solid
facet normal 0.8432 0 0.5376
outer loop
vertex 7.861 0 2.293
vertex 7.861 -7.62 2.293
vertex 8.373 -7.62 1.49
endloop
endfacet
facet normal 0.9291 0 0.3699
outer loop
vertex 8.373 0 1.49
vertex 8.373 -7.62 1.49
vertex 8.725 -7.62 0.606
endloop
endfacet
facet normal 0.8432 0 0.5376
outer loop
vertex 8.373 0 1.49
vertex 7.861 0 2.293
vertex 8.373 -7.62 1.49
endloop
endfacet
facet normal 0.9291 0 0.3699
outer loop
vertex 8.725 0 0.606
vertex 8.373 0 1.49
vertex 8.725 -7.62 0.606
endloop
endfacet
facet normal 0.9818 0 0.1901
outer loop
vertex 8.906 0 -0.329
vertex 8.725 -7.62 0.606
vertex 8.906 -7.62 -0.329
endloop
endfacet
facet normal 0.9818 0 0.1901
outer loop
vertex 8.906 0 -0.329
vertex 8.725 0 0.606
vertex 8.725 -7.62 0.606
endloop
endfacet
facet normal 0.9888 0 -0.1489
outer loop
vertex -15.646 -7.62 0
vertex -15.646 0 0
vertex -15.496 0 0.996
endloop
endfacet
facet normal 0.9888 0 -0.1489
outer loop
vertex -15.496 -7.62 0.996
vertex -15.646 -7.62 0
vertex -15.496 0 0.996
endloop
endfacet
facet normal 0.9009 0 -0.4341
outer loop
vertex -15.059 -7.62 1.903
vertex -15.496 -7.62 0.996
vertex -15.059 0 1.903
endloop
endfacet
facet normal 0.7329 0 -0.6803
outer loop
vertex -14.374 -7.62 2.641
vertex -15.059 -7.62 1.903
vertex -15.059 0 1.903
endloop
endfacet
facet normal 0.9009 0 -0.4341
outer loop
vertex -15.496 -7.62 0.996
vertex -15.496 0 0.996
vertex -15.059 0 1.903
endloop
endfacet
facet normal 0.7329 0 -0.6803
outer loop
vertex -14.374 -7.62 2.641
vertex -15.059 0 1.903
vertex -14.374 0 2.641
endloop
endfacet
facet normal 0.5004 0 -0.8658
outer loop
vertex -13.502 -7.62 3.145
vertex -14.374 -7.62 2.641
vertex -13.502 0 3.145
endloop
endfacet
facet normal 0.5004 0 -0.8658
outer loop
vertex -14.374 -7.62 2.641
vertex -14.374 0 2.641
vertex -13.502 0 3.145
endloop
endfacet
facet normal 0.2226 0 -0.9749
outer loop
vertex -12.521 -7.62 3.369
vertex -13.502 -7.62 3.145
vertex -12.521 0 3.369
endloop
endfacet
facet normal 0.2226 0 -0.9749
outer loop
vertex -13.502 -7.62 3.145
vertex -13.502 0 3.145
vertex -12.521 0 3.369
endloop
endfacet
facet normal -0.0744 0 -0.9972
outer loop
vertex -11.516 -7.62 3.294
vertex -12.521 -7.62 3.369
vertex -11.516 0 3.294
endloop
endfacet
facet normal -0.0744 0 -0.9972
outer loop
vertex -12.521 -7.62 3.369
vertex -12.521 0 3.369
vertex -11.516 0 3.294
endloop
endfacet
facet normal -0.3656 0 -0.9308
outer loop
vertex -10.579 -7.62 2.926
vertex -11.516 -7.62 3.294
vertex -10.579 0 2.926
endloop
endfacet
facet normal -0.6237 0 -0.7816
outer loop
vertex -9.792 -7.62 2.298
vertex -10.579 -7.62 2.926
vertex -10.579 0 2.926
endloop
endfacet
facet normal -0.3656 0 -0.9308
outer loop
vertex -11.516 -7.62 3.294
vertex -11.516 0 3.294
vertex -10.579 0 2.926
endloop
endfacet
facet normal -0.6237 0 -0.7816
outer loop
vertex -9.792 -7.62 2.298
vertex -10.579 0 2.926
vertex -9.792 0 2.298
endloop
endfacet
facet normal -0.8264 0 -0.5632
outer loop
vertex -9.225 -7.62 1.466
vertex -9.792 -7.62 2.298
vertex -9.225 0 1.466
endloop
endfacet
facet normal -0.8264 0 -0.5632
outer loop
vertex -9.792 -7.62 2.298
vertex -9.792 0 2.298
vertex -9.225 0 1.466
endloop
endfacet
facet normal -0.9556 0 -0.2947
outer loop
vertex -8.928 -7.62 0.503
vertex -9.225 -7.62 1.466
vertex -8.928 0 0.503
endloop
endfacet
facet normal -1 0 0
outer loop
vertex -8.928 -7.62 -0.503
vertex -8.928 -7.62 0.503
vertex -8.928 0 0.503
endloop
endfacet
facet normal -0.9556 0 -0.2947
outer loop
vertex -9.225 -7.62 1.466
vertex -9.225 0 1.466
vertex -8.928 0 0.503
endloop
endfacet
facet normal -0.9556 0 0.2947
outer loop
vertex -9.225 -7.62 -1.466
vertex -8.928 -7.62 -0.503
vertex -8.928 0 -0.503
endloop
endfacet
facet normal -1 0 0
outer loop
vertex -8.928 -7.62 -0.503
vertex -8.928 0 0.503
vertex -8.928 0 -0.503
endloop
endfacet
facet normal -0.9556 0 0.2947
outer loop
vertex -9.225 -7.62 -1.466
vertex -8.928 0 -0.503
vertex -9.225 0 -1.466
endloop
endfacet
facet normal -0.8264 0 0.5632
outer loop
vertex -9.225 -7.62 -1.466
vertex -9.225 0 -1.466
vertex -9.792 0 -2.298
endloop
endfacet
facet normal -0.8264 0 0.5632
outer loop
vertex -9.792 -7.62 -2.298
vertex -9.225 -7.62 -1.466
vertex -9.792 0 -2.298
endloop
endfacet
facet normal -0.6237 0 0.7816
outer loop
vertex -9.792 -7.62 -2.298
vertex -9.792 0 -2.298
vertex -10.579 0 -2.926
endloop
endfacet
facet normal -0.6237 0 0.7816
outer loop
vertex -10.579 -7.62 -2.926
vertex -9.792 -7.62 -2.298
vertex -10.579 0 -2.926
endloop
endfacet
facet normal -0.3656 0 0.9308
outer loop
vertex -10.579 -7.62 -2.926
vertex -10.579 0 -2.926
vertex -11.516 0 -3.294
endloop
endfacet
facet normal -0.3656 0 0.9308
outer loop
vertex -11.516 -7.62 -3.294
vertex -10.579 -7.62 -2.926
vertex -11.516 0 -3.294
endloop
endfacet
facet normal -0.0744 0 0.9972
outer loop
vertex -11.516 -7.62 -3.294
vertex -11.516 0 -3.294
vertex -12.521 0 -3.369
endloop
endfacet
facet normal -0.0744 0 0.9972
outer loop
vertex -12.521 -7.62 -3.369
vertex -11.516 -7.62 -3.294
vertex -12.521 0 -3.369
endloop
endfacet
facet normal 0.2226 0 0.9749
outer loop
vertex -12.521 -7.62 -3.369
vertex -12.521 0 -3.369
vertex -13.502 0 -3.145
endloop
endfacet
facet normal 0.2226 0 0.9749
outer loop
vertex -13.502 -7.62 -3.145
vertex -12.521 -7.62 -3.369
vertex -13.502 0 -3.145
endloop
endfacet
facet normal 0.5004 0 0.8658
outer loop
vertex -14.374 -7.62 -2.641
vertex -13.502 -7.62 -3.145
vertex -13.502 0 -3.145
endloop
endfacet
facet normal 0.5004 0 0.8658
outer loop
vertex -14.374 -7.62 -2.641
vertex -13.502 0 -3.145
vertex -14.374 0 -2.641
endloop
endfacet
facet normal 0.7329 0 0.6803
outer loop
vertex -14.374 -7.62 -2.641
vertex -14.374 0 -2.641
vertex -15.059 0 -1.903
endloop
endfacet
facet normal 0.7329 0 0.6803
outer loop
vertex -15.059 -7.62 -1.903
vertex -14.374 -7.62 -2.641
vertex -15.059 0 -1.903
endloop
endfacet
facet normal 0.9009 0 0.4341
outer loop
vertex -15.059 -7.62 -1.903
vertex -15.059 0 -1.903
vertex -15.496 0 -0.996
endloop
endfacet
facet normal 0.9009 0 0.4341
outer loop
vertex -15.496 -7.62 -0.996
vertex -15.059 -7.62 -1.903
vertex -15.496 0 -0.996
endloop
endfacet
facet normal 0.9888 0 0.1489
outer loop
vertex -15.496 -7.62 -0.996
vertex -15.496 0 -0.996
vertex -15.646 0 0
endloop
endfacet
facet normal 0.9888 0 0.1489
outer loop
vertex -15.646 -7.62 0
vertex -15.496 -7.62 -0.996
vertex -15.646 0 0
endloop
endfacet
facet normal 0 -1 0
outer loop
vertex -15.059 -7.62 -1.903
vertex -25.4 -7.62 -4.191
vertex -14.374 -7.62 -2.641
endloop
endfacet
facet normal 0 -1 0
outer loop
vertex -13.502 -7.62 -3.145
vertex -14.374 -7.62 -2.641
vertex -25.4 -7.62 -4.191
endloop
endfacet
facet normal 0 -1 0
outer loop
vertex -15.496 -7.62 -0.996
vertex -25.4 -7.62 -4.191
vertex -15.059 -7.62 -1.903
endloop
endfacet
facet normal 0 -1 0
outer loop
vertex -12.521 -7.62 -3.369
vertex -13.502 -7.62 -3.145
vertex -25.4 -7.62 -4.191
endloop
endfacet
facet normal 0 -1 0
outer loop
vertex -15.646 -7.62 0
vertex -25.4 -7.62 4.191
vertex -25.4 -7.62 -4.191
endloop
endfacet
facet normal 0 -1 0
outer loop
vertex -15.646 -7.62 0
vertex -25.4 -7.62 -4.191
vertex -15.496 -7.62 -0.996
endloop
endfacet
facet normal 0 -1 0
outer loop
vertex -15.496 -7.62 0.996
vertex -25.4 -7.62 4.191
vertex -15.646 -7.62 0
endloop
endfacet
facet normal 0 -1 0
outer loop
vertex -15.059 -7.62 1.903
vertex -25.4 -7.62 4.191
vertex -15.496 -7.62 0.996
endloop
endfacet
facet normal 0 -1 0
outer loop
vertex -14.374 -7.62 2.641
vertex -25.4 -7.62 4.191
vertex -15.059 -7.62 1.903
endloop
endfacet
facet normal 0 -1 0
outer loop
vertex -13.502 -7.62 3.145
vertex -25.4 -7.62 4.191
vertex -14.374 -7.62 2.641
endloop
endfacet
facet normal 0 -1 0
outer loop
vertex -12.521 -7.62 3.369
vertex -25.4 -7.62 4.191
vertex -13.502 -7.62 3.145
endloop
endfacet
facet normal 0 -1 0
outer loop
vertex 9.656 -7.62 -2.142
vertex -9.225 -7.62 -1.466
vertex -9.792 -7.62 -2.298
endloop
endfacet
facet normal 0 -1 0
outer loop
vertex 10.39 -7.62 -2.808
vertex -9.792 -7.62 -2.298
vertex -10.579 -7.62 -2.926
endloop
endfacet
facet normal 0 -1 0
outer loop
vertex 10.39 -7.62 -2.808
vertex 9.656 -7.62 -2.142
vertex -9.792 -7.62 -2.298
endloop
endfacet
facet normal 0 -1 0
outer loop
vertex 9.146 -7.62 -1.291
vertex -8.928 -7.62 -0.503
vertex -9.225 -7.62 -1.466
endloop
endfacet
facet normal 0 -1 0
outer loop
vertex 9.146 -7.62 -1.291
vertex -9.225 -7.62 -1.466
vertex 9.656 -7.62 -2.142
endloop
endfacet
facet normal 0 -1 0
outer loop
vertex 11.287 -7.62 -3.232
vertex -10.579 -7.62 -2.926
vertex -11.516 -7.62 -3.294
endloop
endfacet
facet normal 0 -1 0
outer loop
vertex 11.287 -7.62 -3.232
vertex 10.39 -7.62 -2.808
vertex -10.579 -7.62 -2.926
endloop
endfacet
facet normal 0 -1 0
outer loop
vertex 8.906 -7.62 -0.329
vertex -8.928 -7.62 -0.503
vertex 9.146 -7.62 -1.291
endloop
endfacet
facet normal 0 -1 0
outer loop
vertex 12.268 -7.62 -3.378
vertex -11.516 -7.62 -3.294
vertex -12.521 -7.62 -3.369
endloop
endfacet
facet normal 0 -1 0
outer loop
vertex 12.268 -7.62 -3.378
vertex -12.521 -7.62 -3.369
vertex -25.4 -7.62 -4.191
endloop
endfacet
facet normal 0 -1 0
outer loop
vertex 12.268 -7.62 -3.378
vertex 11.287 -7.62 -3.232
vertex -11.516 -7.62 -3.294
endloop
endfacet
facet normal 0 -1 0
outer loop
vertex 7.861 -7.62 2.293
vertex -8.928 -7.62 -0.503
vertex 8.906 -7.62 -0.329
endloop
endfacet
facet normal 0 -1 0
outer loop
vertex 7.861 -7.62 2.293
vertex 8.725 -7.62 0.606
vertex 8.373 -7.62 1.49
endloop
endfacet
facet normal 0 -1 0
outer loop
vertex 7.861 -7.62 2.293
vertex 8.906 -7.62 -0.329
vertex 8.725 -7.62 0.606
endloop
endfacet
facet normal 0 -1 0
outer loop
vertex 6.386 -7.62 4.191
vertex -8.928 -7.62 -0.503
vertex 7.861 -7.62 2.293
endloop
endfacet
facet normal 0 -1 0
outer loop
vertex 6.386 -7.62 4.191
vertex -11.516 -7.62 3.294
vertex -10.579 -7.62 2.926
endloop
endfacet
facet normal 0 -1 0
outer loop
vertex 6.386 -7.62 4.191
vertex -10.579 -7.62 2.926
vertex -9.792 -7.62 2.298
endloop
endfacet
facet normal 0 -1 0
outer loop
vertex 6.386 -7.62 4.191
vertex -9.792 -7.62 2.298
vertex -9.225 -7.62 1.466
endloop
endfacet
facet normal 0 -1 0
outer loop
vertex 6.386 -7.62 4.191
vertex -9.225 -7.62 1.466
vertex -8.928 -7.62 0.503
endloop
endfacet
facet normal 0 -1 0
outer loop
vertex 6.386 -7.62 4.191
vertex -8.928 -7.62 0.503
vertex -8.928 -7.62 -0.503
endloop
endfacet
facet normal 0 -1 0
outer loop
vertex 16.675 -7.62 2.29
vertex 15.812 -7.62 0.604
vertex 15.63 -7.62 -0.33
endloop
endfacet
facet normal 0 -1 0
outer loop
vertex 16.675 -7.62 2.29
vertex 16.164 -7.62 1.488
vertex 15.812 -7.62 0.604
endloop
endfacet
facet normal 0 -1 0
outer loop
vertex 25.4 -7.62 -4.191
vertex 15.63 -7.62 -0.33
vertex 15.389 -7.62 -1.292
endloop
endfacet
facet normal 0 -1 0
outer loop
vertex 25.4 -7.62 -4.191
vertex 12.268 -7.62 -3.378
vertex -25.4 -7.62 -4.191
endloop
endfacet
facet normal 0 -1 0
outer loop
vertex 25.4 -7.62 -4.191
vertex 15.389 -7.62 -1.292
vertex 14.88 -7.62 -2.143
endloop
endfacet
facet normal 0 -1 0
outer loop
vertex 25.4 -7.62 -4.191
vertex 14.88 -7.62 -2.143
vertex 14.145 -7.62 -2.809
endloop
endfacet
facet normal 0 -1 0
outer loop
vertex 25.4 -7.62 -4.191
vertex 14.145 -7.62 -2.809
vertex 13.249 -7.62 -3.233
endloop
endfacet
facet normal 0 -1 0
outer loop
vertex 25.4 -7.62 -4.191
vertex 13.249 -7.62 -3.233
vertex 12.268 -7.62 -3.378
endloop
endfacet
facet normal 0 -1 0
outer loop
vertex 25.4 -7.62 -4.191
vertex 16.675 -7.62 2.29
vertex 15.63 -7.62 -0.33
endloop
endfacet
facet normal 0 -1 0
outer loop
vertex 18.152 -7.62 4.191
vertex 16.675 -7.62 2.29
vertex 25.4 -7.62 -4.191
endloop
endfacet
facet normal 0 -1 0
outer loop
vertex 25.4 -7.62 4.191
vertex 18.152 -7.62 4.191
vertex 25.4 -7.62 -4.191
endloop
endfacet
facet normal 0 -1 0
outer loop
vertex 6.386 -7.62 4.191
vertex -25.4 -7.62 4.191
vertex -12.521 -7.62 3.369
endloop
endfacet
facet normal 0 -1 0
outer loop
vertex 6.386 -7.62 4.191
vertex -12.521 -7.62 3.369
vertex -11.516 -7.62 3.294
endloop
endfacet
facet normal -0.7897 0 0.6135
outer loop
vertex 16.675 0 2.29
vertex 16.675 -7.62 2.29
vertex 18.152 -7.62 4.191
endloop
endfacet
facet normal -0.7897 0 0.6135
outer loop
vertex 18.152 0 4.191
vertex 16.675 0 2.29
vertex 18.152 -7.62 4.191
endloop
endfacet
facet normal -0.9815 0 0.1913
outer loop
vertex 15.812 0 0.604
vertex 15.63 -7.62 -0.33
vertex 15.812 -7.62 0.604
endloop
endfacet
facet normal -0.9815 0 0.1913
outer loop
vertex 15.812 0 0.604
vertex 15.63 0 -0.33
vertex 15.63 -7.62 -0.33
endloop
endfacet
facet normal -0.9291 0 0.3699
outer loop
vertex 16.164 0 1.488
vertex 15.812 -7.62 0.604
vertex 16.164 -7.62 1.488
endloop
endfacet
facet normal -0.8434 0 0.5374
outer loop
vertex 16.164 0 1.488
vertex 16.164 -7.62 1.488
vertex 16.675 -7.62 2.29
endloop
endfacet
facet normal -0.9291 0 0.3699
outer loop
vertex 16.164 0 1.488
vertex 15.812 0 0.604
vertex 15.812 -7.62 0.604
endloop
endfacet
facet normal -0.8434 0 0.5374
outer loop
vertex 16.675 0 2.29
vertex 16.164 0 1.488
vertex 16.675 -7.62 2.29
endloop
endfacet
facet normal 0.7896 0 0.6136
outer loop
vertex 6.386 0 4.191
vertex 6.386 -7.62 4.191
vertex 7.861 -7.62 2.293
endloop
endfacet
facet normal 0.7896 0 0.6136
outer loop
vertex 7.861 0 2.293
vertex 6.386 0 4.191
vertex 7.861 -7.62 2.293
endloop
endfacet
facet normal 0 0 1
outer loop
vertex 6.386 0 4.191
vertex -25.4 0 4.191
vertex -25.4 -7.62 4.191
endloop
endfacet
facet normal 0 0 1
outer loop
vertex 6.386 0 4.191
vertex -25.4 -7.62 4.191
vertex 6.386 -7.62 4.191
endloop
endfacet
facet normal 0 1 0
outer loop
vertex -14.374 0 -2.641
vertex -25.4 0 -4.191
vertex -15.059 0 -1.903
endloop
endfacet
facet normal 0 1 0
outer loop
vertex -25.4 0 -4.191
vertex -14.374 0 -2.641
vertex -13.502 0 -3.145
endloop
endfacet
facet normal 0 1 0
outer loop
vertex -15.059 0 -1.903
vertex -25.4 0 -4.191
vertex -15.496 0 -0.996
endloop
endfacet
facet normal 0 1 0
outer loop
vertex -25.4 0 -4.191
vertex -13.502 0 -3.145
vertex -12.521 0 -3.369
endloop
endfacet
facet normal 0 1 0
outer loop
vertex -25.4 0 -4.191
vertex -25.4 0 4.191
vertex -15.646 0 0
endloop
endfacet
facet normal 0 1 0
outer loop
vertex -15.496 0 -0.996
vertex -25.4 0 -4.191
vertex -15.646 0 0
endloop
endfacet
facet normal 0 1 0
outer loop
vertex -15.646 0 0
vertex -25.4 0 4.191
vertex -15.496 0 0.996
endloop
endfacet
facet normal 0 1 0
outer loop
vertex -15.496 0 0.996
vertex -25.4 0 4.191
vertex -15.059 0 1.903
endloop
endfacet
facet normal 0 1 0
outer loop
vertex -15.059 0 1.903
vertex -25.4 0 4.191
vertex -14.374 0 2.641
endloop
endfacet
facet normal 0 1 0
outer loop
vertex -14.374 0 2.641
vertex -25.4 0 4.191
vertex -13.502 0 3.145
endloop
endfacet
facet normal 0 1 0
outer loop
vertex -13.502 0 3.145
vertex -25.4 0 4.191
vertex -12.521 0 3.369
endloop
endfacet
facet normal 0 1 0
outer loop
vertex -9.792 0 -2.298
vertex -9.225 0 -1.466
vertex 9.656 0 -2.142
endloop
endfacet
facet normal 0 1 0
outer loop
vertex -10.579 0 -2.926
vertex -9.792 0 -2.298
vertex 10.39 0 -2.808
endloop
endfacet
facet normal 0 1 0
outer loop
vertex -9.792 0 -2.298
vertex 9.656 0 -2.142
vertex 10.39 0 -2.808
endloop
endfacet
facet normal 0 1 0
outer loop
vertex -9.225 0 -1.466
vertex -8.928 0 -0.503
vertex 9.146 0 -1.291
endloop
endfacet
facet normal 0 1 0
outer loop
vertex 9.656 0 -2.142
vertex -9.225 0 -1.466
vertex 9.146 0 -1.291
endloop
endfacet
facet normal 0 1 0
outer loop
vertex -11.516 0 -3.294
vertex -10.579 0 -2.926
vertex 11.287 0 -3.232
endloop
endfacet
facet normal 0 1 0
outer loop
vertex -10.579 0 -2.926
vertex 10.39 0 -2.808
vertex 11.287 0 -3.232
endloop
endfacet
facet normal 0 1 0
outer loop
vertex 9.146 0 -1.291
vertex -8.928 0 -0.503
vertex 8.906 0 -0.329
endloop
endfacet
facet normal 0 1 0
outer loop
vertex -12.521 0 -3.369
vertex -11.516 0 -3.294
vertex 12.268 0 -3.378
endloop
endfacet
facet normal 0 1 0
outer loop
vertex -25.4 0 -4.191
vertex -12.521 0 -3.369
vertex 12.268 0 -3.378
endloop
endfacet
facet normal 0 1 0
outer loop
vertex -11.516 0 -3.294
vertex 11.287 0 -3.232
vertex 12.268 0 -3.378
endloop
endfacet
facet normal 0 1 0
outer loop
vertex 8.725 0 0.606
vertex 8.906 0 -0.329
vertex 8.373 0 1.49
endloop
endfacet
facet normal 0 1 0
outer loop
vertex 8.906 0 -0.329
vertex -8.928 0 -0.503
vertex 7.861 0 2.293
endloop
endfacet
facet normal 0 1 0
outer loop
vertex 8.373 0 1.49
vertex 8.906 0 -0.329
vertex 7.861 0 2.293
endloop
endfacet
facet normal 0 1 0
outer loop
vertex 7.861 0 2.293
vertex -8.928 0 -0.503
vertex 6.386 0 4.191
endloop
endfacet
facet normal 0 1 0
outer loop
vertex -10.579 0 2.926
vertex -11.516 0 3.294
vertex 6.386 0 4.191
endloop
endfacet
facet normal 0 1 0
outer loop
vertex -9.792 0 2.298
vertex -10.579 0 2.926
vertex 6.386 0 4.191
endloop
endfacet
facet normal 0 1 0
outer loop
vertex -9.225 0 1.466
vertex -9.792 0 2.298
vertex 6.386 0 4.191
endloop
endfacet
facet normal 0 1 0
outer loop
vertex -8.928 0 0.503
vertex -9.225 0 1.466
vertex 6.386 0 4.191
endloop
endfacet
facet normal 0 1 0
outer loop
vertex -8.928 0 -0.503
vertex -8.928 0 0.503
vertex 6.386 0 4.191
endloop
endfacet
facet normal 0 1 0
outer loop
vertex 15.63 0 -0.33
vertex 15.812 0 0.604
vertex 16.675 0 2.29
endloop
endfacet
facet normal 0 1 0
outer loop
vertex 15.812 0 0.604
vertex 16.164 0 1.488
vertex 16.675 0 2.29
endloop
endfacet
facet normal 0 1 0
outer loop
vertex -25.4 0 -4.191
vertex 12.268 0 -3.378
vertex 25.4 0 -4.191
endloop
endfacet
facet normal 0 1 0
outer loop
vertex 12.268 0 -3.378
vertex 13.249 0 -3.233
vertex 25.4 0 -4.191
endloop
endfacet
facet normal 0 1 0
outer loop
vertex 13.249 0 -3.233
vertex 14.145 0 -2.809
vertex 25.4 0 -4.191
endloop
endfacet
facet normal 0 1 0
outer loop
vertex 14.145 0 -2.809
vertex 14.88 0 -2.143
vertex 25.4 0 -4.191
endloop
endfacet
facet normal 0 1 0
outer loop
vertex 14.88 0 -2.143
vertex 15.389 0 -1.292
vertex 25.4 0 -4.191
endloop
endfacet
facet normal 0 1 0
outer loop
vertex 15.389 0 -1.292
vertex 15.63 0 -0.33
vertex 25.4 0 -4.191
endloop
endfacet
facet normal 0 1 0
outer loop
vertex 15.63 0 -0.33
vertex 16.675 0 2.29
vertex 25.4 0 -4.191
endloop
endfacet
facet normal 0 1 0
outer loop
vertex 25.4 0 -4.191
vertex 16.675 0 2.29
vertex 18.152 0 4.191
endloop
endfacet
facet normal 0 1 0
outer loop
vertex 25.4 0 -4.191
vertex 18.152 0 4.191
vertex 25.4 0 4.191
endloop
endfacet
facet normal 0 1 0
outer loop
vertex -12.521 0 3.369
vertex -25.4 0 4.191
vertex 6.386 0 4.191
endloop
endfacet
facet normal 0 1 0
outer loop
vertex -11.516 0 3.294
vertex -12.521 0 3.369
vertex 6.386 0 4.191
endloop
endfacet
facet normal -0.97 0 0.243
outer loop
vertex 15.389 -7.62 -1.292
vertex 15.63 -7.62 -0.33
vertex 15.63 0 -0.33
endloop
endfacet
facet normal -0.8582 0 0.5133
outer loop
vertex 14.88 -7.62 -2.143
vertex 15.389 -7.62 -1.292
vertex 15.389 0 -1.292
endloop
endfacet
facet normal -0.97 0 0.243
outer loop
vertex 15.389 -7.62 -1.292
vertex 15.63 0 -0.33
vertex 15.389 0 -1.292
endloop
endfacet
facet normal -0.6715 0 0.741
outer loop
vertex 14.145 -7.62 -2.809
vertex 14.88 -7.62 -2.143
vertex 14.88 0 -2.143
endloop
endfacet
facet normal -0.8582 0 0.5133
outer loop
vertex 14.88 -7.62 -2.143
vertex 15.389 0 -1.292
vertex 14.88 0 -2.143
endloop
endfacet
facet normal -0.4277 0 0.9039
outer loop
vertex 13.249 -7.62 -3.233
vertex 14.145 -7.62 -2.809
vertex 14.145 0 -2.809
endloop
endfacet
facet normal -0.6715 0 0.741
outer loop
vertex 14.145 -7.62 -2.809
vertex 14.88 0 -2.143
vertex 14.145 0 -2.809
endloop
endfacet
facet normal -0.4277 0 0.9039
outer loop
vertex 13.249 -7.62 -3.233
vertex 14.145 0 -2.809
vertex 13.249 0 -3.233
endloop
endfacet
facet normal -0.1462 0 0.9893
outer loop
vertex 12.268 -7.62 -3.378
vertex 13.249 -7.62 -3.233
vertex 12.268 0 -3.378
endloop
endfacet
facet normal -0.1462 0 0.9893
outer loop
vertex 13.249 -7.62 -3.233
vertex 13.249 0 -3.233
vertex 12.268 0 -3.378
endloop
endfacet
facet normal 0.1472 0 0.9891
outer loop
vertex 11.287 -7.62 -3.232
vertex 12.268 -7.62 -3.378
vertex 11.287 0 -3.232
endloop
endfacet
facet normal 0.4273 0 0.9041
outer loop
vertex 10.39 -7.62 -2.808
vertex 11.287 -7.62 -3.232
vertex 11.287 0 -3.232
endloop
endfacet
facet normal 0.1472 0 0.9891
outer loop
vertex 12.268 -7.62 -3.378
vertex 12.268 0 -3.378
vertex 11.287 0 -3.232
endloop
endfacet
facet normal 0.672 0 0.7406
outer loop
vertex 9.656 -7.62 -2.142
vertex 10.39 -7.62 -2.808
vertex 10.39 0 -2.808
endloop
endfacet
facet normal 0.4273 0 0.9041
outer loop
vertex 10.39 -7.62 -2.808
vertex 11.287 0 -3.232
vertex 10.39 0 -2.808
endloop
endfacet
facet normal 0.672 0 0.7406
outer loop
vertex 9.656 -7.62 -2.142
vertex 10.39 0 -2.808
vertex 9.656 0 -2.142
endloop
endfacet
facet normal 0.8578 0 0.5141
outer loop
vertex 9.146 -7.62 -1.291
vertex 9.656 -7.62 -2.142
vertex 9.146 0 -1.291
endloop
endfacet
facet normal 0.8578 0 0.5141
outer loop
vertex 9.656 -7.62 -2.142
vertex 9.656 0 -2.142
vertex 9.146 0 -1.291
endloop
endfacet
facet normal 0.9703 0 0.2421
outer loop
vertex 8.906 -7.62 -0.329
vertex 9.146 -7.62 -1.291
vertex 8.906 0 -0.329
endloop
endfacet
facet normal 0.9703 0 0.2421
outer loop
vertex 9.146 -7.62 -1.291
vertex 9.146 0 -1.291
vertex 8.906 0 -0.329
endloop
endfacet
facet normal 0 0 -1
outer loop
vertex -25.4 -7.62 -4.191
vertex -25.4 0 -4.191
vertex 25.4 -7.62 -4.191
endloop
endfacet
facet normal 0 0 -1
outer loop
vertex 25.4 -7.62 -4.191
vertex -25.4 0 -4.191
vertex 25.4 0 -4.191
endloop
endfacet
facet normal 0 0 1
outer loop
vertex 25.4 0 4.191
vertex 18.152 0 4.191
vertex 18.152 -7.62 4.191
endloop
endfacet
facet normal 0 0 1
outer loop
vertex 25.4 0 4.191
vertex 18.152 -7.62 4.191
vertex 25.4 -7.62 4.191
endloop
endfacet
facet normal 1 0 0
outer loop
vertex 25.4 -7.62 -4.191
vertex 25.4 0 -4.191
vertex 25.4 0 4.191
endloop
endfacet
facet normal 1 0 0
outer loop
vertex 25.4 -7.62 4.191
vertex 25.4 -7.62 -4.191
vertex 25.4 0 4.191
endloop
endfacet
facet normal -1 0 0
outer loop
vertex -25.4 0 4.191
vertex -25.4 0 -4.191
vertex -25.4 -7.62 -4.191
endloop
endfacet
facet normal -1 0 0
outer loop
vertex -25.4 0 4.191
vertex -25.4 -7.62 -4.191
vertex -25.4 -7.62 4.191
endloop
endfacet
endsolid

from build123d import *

# Parameters (mm, degrees)
F0_W     = 50.8
F0_H     = 8.382
F1_DEPTH = 7.62
F3_D     = 6.7564
F3_DEPTH = 23.3426
F3_TIP   = 2.0298273432
F5_DEPTH = 25.4
F6_R     = 5.08


with BuildPart() as f1:
    # F0 (on Front) → F1 (new body)
    with BuildSketch(Plane.XZ):
        Rectangle(F0_W, F0_H)
    extrude(amount=F1_DEPTH)

    # F3
    with Locations(Plane.XZ.offset(7.62)):
        with Locations((-12.2682, 0), (12.2682, 0)):
            Hole(F3_D / 2, depth=F3_DEPTH)
            with Locations((0, 0, -(F3_DEPTH + F3_TIP / 2))):  # 118° drill point
                Cone(0, F3_D / 2, F3_TIP, mode=Mode.SUBTRACT)

    # F4 (on face) → F5 (cut)
    with BuildSketch(Plane.XZ.offset(7.62)):
        with BuildLine():
            Line((6.3864027151, 4.191), (8.9947894332, 0.8348763389))
            ThreePointArc((8.9947894332, 0.8348763389), (12.2692015488, 3.3781998515), (15.5421050298, 0.8329352293))
            Line((15.5421050298, 0.8329352293), (18.1520003825, 4.191))
            Line((18.1520003825, 4.191), (6.3864027151, 4.191))
        make_face()
    extrude(amount=-F5_DEPTH, mode=Mode.SUBTRACT)

    # F6
    f6_edges = [f1.edges().sort_by_distance(p)[0] for p in [
        (8.994789, -3.81, 0.834876),
        (15.542105, -3.81, 0.832935),
    ]]
    fillet(f6_edges, radius=F6_R)


solid = f1.part
